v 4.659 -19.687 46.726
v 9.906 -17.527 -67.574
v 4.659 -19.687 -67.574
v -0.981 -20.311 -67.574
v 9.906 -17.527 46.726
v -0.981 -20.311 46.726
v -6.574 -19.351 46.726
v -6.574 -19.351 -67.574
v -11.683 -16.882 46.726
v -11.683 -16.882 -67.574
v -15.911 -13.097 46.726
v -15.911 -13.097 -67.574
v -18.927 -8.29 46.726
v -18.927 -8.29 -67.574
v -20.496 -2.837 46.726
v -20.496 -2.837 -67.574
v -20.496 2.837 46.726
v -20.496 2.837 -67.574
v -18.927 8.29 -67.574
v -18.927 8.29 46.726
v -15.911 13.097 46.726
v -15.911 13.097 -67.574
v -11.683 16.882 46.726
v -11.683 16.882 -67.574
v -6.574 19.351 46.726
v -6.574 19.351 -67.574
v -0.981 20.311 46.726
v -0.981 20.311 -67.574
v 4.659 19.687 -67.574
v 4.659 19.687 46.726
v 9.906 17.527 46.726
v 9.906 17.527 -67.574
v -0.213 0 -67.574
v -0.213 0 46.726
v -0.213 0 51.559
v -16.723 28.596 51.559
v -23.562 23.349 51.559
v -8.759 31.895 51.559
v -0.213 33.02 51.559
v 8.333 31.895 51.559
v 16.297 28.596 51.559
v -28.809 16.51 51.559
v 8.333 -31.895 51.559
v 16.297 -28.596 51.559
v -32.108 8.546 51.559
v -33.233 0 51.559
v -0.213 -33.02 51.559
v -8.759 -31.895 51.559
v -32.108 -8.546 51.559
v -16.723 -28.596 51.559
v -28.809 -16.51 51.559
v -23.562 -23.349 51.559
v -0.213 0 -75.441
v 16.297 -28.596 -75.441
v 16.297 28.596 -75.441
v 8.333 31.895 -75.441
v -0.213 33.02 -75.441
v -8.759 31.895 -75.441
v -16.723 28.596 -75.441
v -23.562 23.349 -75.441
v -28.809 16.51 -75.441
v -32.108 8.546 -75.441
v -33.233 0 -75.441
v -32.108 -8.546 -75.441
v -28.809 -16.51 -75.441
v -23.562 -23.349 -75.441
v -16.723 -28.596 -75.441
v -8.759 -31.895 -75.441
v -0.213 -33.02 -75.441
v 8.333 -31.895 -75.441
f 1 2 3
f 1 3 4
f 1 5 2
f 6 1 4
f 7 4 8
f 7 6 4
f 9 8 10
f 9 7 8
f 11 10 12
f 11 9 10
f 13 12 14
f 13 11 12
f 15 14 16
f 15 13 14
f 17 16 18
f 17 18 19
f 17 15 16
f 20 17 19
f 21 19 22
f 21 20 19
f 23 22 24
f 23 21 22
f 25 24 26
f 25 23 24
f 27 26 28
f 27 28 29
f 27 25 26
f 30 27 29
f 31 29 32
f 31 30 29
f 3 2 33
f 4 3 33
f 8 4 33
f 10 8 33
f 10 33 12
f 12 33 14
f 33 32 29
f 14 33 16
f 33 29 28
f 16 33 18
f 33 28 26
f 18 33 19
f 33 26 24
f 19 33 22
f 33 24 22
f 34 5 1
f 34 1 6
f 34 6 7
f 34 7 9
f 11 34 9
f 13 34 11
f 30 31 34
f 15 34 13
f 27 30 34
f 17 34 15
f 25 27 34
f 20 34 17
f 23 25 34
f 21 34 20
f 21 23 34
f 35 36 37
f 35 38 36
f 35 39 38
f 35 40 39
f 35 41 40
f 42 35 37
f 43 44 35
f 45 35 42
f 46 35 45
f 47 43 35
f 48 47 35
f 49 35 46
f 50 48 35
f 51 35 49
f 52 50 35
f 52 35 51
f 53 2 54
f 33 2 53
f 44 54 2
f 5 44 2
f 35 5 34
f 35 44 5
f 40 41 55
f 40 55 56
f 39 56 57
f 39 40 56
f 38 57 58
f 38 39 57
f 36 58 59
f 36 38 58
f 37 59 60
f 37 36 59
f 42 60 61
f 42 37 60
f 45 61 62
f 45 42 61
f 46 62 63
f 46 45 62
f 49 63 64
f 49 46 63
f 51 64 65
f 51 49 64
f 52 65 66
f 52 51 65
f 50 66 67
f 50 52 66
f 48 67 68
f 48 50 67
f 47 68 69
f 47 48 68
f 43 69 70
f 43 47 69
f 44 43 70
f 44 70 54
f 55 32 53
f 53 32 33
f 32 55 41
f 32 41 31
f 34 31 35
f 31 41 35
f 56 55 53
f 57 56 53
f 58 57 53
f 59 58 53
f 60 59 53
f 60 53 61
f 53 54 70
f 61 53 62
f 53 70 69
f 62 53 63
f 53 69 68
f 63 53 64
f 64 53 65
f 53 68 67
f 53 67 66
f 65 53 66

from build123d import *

# Parameters (mm, degrees)
F0_W     = 33.02
F0_H     = 127
F1_ANGLE = 240
F2_W     = 20.32
F2_H     = 114.3


with BuildPart() as f1:
    # F0 (on Front) → F1 (revolve, symmetric)
    with BuildSketch(Plane.XZ) as f1_sk:
        with Locations((-16.722997, -11.941442)):
            Rectangle(F0_W, F0_H)
    revolve(axis=Axis((-0.212997, 0, -11.941442), (0, 0, -1)), revolution_arc=F1_ANGLE / 2)
    revolve(f1_sk.sketch, axis=Axis((-0.212997, 0, -11.941442), (0, 0, 1)), revolution_arc=F1_ANGLE / 2)

    # F2 (on Front) → F3 (revolve, cut)
    with BuildSketch(Plane.XZ):
        with Locations((-10.534671, -10.423937)):
            Rectangle(F2_W, F2_H)
    revolve(axis=Axis((-0.374671, 0, -10.423937), (0, 0, -1)), mode=Mode.SUBTRACT)


solid = f1.part
